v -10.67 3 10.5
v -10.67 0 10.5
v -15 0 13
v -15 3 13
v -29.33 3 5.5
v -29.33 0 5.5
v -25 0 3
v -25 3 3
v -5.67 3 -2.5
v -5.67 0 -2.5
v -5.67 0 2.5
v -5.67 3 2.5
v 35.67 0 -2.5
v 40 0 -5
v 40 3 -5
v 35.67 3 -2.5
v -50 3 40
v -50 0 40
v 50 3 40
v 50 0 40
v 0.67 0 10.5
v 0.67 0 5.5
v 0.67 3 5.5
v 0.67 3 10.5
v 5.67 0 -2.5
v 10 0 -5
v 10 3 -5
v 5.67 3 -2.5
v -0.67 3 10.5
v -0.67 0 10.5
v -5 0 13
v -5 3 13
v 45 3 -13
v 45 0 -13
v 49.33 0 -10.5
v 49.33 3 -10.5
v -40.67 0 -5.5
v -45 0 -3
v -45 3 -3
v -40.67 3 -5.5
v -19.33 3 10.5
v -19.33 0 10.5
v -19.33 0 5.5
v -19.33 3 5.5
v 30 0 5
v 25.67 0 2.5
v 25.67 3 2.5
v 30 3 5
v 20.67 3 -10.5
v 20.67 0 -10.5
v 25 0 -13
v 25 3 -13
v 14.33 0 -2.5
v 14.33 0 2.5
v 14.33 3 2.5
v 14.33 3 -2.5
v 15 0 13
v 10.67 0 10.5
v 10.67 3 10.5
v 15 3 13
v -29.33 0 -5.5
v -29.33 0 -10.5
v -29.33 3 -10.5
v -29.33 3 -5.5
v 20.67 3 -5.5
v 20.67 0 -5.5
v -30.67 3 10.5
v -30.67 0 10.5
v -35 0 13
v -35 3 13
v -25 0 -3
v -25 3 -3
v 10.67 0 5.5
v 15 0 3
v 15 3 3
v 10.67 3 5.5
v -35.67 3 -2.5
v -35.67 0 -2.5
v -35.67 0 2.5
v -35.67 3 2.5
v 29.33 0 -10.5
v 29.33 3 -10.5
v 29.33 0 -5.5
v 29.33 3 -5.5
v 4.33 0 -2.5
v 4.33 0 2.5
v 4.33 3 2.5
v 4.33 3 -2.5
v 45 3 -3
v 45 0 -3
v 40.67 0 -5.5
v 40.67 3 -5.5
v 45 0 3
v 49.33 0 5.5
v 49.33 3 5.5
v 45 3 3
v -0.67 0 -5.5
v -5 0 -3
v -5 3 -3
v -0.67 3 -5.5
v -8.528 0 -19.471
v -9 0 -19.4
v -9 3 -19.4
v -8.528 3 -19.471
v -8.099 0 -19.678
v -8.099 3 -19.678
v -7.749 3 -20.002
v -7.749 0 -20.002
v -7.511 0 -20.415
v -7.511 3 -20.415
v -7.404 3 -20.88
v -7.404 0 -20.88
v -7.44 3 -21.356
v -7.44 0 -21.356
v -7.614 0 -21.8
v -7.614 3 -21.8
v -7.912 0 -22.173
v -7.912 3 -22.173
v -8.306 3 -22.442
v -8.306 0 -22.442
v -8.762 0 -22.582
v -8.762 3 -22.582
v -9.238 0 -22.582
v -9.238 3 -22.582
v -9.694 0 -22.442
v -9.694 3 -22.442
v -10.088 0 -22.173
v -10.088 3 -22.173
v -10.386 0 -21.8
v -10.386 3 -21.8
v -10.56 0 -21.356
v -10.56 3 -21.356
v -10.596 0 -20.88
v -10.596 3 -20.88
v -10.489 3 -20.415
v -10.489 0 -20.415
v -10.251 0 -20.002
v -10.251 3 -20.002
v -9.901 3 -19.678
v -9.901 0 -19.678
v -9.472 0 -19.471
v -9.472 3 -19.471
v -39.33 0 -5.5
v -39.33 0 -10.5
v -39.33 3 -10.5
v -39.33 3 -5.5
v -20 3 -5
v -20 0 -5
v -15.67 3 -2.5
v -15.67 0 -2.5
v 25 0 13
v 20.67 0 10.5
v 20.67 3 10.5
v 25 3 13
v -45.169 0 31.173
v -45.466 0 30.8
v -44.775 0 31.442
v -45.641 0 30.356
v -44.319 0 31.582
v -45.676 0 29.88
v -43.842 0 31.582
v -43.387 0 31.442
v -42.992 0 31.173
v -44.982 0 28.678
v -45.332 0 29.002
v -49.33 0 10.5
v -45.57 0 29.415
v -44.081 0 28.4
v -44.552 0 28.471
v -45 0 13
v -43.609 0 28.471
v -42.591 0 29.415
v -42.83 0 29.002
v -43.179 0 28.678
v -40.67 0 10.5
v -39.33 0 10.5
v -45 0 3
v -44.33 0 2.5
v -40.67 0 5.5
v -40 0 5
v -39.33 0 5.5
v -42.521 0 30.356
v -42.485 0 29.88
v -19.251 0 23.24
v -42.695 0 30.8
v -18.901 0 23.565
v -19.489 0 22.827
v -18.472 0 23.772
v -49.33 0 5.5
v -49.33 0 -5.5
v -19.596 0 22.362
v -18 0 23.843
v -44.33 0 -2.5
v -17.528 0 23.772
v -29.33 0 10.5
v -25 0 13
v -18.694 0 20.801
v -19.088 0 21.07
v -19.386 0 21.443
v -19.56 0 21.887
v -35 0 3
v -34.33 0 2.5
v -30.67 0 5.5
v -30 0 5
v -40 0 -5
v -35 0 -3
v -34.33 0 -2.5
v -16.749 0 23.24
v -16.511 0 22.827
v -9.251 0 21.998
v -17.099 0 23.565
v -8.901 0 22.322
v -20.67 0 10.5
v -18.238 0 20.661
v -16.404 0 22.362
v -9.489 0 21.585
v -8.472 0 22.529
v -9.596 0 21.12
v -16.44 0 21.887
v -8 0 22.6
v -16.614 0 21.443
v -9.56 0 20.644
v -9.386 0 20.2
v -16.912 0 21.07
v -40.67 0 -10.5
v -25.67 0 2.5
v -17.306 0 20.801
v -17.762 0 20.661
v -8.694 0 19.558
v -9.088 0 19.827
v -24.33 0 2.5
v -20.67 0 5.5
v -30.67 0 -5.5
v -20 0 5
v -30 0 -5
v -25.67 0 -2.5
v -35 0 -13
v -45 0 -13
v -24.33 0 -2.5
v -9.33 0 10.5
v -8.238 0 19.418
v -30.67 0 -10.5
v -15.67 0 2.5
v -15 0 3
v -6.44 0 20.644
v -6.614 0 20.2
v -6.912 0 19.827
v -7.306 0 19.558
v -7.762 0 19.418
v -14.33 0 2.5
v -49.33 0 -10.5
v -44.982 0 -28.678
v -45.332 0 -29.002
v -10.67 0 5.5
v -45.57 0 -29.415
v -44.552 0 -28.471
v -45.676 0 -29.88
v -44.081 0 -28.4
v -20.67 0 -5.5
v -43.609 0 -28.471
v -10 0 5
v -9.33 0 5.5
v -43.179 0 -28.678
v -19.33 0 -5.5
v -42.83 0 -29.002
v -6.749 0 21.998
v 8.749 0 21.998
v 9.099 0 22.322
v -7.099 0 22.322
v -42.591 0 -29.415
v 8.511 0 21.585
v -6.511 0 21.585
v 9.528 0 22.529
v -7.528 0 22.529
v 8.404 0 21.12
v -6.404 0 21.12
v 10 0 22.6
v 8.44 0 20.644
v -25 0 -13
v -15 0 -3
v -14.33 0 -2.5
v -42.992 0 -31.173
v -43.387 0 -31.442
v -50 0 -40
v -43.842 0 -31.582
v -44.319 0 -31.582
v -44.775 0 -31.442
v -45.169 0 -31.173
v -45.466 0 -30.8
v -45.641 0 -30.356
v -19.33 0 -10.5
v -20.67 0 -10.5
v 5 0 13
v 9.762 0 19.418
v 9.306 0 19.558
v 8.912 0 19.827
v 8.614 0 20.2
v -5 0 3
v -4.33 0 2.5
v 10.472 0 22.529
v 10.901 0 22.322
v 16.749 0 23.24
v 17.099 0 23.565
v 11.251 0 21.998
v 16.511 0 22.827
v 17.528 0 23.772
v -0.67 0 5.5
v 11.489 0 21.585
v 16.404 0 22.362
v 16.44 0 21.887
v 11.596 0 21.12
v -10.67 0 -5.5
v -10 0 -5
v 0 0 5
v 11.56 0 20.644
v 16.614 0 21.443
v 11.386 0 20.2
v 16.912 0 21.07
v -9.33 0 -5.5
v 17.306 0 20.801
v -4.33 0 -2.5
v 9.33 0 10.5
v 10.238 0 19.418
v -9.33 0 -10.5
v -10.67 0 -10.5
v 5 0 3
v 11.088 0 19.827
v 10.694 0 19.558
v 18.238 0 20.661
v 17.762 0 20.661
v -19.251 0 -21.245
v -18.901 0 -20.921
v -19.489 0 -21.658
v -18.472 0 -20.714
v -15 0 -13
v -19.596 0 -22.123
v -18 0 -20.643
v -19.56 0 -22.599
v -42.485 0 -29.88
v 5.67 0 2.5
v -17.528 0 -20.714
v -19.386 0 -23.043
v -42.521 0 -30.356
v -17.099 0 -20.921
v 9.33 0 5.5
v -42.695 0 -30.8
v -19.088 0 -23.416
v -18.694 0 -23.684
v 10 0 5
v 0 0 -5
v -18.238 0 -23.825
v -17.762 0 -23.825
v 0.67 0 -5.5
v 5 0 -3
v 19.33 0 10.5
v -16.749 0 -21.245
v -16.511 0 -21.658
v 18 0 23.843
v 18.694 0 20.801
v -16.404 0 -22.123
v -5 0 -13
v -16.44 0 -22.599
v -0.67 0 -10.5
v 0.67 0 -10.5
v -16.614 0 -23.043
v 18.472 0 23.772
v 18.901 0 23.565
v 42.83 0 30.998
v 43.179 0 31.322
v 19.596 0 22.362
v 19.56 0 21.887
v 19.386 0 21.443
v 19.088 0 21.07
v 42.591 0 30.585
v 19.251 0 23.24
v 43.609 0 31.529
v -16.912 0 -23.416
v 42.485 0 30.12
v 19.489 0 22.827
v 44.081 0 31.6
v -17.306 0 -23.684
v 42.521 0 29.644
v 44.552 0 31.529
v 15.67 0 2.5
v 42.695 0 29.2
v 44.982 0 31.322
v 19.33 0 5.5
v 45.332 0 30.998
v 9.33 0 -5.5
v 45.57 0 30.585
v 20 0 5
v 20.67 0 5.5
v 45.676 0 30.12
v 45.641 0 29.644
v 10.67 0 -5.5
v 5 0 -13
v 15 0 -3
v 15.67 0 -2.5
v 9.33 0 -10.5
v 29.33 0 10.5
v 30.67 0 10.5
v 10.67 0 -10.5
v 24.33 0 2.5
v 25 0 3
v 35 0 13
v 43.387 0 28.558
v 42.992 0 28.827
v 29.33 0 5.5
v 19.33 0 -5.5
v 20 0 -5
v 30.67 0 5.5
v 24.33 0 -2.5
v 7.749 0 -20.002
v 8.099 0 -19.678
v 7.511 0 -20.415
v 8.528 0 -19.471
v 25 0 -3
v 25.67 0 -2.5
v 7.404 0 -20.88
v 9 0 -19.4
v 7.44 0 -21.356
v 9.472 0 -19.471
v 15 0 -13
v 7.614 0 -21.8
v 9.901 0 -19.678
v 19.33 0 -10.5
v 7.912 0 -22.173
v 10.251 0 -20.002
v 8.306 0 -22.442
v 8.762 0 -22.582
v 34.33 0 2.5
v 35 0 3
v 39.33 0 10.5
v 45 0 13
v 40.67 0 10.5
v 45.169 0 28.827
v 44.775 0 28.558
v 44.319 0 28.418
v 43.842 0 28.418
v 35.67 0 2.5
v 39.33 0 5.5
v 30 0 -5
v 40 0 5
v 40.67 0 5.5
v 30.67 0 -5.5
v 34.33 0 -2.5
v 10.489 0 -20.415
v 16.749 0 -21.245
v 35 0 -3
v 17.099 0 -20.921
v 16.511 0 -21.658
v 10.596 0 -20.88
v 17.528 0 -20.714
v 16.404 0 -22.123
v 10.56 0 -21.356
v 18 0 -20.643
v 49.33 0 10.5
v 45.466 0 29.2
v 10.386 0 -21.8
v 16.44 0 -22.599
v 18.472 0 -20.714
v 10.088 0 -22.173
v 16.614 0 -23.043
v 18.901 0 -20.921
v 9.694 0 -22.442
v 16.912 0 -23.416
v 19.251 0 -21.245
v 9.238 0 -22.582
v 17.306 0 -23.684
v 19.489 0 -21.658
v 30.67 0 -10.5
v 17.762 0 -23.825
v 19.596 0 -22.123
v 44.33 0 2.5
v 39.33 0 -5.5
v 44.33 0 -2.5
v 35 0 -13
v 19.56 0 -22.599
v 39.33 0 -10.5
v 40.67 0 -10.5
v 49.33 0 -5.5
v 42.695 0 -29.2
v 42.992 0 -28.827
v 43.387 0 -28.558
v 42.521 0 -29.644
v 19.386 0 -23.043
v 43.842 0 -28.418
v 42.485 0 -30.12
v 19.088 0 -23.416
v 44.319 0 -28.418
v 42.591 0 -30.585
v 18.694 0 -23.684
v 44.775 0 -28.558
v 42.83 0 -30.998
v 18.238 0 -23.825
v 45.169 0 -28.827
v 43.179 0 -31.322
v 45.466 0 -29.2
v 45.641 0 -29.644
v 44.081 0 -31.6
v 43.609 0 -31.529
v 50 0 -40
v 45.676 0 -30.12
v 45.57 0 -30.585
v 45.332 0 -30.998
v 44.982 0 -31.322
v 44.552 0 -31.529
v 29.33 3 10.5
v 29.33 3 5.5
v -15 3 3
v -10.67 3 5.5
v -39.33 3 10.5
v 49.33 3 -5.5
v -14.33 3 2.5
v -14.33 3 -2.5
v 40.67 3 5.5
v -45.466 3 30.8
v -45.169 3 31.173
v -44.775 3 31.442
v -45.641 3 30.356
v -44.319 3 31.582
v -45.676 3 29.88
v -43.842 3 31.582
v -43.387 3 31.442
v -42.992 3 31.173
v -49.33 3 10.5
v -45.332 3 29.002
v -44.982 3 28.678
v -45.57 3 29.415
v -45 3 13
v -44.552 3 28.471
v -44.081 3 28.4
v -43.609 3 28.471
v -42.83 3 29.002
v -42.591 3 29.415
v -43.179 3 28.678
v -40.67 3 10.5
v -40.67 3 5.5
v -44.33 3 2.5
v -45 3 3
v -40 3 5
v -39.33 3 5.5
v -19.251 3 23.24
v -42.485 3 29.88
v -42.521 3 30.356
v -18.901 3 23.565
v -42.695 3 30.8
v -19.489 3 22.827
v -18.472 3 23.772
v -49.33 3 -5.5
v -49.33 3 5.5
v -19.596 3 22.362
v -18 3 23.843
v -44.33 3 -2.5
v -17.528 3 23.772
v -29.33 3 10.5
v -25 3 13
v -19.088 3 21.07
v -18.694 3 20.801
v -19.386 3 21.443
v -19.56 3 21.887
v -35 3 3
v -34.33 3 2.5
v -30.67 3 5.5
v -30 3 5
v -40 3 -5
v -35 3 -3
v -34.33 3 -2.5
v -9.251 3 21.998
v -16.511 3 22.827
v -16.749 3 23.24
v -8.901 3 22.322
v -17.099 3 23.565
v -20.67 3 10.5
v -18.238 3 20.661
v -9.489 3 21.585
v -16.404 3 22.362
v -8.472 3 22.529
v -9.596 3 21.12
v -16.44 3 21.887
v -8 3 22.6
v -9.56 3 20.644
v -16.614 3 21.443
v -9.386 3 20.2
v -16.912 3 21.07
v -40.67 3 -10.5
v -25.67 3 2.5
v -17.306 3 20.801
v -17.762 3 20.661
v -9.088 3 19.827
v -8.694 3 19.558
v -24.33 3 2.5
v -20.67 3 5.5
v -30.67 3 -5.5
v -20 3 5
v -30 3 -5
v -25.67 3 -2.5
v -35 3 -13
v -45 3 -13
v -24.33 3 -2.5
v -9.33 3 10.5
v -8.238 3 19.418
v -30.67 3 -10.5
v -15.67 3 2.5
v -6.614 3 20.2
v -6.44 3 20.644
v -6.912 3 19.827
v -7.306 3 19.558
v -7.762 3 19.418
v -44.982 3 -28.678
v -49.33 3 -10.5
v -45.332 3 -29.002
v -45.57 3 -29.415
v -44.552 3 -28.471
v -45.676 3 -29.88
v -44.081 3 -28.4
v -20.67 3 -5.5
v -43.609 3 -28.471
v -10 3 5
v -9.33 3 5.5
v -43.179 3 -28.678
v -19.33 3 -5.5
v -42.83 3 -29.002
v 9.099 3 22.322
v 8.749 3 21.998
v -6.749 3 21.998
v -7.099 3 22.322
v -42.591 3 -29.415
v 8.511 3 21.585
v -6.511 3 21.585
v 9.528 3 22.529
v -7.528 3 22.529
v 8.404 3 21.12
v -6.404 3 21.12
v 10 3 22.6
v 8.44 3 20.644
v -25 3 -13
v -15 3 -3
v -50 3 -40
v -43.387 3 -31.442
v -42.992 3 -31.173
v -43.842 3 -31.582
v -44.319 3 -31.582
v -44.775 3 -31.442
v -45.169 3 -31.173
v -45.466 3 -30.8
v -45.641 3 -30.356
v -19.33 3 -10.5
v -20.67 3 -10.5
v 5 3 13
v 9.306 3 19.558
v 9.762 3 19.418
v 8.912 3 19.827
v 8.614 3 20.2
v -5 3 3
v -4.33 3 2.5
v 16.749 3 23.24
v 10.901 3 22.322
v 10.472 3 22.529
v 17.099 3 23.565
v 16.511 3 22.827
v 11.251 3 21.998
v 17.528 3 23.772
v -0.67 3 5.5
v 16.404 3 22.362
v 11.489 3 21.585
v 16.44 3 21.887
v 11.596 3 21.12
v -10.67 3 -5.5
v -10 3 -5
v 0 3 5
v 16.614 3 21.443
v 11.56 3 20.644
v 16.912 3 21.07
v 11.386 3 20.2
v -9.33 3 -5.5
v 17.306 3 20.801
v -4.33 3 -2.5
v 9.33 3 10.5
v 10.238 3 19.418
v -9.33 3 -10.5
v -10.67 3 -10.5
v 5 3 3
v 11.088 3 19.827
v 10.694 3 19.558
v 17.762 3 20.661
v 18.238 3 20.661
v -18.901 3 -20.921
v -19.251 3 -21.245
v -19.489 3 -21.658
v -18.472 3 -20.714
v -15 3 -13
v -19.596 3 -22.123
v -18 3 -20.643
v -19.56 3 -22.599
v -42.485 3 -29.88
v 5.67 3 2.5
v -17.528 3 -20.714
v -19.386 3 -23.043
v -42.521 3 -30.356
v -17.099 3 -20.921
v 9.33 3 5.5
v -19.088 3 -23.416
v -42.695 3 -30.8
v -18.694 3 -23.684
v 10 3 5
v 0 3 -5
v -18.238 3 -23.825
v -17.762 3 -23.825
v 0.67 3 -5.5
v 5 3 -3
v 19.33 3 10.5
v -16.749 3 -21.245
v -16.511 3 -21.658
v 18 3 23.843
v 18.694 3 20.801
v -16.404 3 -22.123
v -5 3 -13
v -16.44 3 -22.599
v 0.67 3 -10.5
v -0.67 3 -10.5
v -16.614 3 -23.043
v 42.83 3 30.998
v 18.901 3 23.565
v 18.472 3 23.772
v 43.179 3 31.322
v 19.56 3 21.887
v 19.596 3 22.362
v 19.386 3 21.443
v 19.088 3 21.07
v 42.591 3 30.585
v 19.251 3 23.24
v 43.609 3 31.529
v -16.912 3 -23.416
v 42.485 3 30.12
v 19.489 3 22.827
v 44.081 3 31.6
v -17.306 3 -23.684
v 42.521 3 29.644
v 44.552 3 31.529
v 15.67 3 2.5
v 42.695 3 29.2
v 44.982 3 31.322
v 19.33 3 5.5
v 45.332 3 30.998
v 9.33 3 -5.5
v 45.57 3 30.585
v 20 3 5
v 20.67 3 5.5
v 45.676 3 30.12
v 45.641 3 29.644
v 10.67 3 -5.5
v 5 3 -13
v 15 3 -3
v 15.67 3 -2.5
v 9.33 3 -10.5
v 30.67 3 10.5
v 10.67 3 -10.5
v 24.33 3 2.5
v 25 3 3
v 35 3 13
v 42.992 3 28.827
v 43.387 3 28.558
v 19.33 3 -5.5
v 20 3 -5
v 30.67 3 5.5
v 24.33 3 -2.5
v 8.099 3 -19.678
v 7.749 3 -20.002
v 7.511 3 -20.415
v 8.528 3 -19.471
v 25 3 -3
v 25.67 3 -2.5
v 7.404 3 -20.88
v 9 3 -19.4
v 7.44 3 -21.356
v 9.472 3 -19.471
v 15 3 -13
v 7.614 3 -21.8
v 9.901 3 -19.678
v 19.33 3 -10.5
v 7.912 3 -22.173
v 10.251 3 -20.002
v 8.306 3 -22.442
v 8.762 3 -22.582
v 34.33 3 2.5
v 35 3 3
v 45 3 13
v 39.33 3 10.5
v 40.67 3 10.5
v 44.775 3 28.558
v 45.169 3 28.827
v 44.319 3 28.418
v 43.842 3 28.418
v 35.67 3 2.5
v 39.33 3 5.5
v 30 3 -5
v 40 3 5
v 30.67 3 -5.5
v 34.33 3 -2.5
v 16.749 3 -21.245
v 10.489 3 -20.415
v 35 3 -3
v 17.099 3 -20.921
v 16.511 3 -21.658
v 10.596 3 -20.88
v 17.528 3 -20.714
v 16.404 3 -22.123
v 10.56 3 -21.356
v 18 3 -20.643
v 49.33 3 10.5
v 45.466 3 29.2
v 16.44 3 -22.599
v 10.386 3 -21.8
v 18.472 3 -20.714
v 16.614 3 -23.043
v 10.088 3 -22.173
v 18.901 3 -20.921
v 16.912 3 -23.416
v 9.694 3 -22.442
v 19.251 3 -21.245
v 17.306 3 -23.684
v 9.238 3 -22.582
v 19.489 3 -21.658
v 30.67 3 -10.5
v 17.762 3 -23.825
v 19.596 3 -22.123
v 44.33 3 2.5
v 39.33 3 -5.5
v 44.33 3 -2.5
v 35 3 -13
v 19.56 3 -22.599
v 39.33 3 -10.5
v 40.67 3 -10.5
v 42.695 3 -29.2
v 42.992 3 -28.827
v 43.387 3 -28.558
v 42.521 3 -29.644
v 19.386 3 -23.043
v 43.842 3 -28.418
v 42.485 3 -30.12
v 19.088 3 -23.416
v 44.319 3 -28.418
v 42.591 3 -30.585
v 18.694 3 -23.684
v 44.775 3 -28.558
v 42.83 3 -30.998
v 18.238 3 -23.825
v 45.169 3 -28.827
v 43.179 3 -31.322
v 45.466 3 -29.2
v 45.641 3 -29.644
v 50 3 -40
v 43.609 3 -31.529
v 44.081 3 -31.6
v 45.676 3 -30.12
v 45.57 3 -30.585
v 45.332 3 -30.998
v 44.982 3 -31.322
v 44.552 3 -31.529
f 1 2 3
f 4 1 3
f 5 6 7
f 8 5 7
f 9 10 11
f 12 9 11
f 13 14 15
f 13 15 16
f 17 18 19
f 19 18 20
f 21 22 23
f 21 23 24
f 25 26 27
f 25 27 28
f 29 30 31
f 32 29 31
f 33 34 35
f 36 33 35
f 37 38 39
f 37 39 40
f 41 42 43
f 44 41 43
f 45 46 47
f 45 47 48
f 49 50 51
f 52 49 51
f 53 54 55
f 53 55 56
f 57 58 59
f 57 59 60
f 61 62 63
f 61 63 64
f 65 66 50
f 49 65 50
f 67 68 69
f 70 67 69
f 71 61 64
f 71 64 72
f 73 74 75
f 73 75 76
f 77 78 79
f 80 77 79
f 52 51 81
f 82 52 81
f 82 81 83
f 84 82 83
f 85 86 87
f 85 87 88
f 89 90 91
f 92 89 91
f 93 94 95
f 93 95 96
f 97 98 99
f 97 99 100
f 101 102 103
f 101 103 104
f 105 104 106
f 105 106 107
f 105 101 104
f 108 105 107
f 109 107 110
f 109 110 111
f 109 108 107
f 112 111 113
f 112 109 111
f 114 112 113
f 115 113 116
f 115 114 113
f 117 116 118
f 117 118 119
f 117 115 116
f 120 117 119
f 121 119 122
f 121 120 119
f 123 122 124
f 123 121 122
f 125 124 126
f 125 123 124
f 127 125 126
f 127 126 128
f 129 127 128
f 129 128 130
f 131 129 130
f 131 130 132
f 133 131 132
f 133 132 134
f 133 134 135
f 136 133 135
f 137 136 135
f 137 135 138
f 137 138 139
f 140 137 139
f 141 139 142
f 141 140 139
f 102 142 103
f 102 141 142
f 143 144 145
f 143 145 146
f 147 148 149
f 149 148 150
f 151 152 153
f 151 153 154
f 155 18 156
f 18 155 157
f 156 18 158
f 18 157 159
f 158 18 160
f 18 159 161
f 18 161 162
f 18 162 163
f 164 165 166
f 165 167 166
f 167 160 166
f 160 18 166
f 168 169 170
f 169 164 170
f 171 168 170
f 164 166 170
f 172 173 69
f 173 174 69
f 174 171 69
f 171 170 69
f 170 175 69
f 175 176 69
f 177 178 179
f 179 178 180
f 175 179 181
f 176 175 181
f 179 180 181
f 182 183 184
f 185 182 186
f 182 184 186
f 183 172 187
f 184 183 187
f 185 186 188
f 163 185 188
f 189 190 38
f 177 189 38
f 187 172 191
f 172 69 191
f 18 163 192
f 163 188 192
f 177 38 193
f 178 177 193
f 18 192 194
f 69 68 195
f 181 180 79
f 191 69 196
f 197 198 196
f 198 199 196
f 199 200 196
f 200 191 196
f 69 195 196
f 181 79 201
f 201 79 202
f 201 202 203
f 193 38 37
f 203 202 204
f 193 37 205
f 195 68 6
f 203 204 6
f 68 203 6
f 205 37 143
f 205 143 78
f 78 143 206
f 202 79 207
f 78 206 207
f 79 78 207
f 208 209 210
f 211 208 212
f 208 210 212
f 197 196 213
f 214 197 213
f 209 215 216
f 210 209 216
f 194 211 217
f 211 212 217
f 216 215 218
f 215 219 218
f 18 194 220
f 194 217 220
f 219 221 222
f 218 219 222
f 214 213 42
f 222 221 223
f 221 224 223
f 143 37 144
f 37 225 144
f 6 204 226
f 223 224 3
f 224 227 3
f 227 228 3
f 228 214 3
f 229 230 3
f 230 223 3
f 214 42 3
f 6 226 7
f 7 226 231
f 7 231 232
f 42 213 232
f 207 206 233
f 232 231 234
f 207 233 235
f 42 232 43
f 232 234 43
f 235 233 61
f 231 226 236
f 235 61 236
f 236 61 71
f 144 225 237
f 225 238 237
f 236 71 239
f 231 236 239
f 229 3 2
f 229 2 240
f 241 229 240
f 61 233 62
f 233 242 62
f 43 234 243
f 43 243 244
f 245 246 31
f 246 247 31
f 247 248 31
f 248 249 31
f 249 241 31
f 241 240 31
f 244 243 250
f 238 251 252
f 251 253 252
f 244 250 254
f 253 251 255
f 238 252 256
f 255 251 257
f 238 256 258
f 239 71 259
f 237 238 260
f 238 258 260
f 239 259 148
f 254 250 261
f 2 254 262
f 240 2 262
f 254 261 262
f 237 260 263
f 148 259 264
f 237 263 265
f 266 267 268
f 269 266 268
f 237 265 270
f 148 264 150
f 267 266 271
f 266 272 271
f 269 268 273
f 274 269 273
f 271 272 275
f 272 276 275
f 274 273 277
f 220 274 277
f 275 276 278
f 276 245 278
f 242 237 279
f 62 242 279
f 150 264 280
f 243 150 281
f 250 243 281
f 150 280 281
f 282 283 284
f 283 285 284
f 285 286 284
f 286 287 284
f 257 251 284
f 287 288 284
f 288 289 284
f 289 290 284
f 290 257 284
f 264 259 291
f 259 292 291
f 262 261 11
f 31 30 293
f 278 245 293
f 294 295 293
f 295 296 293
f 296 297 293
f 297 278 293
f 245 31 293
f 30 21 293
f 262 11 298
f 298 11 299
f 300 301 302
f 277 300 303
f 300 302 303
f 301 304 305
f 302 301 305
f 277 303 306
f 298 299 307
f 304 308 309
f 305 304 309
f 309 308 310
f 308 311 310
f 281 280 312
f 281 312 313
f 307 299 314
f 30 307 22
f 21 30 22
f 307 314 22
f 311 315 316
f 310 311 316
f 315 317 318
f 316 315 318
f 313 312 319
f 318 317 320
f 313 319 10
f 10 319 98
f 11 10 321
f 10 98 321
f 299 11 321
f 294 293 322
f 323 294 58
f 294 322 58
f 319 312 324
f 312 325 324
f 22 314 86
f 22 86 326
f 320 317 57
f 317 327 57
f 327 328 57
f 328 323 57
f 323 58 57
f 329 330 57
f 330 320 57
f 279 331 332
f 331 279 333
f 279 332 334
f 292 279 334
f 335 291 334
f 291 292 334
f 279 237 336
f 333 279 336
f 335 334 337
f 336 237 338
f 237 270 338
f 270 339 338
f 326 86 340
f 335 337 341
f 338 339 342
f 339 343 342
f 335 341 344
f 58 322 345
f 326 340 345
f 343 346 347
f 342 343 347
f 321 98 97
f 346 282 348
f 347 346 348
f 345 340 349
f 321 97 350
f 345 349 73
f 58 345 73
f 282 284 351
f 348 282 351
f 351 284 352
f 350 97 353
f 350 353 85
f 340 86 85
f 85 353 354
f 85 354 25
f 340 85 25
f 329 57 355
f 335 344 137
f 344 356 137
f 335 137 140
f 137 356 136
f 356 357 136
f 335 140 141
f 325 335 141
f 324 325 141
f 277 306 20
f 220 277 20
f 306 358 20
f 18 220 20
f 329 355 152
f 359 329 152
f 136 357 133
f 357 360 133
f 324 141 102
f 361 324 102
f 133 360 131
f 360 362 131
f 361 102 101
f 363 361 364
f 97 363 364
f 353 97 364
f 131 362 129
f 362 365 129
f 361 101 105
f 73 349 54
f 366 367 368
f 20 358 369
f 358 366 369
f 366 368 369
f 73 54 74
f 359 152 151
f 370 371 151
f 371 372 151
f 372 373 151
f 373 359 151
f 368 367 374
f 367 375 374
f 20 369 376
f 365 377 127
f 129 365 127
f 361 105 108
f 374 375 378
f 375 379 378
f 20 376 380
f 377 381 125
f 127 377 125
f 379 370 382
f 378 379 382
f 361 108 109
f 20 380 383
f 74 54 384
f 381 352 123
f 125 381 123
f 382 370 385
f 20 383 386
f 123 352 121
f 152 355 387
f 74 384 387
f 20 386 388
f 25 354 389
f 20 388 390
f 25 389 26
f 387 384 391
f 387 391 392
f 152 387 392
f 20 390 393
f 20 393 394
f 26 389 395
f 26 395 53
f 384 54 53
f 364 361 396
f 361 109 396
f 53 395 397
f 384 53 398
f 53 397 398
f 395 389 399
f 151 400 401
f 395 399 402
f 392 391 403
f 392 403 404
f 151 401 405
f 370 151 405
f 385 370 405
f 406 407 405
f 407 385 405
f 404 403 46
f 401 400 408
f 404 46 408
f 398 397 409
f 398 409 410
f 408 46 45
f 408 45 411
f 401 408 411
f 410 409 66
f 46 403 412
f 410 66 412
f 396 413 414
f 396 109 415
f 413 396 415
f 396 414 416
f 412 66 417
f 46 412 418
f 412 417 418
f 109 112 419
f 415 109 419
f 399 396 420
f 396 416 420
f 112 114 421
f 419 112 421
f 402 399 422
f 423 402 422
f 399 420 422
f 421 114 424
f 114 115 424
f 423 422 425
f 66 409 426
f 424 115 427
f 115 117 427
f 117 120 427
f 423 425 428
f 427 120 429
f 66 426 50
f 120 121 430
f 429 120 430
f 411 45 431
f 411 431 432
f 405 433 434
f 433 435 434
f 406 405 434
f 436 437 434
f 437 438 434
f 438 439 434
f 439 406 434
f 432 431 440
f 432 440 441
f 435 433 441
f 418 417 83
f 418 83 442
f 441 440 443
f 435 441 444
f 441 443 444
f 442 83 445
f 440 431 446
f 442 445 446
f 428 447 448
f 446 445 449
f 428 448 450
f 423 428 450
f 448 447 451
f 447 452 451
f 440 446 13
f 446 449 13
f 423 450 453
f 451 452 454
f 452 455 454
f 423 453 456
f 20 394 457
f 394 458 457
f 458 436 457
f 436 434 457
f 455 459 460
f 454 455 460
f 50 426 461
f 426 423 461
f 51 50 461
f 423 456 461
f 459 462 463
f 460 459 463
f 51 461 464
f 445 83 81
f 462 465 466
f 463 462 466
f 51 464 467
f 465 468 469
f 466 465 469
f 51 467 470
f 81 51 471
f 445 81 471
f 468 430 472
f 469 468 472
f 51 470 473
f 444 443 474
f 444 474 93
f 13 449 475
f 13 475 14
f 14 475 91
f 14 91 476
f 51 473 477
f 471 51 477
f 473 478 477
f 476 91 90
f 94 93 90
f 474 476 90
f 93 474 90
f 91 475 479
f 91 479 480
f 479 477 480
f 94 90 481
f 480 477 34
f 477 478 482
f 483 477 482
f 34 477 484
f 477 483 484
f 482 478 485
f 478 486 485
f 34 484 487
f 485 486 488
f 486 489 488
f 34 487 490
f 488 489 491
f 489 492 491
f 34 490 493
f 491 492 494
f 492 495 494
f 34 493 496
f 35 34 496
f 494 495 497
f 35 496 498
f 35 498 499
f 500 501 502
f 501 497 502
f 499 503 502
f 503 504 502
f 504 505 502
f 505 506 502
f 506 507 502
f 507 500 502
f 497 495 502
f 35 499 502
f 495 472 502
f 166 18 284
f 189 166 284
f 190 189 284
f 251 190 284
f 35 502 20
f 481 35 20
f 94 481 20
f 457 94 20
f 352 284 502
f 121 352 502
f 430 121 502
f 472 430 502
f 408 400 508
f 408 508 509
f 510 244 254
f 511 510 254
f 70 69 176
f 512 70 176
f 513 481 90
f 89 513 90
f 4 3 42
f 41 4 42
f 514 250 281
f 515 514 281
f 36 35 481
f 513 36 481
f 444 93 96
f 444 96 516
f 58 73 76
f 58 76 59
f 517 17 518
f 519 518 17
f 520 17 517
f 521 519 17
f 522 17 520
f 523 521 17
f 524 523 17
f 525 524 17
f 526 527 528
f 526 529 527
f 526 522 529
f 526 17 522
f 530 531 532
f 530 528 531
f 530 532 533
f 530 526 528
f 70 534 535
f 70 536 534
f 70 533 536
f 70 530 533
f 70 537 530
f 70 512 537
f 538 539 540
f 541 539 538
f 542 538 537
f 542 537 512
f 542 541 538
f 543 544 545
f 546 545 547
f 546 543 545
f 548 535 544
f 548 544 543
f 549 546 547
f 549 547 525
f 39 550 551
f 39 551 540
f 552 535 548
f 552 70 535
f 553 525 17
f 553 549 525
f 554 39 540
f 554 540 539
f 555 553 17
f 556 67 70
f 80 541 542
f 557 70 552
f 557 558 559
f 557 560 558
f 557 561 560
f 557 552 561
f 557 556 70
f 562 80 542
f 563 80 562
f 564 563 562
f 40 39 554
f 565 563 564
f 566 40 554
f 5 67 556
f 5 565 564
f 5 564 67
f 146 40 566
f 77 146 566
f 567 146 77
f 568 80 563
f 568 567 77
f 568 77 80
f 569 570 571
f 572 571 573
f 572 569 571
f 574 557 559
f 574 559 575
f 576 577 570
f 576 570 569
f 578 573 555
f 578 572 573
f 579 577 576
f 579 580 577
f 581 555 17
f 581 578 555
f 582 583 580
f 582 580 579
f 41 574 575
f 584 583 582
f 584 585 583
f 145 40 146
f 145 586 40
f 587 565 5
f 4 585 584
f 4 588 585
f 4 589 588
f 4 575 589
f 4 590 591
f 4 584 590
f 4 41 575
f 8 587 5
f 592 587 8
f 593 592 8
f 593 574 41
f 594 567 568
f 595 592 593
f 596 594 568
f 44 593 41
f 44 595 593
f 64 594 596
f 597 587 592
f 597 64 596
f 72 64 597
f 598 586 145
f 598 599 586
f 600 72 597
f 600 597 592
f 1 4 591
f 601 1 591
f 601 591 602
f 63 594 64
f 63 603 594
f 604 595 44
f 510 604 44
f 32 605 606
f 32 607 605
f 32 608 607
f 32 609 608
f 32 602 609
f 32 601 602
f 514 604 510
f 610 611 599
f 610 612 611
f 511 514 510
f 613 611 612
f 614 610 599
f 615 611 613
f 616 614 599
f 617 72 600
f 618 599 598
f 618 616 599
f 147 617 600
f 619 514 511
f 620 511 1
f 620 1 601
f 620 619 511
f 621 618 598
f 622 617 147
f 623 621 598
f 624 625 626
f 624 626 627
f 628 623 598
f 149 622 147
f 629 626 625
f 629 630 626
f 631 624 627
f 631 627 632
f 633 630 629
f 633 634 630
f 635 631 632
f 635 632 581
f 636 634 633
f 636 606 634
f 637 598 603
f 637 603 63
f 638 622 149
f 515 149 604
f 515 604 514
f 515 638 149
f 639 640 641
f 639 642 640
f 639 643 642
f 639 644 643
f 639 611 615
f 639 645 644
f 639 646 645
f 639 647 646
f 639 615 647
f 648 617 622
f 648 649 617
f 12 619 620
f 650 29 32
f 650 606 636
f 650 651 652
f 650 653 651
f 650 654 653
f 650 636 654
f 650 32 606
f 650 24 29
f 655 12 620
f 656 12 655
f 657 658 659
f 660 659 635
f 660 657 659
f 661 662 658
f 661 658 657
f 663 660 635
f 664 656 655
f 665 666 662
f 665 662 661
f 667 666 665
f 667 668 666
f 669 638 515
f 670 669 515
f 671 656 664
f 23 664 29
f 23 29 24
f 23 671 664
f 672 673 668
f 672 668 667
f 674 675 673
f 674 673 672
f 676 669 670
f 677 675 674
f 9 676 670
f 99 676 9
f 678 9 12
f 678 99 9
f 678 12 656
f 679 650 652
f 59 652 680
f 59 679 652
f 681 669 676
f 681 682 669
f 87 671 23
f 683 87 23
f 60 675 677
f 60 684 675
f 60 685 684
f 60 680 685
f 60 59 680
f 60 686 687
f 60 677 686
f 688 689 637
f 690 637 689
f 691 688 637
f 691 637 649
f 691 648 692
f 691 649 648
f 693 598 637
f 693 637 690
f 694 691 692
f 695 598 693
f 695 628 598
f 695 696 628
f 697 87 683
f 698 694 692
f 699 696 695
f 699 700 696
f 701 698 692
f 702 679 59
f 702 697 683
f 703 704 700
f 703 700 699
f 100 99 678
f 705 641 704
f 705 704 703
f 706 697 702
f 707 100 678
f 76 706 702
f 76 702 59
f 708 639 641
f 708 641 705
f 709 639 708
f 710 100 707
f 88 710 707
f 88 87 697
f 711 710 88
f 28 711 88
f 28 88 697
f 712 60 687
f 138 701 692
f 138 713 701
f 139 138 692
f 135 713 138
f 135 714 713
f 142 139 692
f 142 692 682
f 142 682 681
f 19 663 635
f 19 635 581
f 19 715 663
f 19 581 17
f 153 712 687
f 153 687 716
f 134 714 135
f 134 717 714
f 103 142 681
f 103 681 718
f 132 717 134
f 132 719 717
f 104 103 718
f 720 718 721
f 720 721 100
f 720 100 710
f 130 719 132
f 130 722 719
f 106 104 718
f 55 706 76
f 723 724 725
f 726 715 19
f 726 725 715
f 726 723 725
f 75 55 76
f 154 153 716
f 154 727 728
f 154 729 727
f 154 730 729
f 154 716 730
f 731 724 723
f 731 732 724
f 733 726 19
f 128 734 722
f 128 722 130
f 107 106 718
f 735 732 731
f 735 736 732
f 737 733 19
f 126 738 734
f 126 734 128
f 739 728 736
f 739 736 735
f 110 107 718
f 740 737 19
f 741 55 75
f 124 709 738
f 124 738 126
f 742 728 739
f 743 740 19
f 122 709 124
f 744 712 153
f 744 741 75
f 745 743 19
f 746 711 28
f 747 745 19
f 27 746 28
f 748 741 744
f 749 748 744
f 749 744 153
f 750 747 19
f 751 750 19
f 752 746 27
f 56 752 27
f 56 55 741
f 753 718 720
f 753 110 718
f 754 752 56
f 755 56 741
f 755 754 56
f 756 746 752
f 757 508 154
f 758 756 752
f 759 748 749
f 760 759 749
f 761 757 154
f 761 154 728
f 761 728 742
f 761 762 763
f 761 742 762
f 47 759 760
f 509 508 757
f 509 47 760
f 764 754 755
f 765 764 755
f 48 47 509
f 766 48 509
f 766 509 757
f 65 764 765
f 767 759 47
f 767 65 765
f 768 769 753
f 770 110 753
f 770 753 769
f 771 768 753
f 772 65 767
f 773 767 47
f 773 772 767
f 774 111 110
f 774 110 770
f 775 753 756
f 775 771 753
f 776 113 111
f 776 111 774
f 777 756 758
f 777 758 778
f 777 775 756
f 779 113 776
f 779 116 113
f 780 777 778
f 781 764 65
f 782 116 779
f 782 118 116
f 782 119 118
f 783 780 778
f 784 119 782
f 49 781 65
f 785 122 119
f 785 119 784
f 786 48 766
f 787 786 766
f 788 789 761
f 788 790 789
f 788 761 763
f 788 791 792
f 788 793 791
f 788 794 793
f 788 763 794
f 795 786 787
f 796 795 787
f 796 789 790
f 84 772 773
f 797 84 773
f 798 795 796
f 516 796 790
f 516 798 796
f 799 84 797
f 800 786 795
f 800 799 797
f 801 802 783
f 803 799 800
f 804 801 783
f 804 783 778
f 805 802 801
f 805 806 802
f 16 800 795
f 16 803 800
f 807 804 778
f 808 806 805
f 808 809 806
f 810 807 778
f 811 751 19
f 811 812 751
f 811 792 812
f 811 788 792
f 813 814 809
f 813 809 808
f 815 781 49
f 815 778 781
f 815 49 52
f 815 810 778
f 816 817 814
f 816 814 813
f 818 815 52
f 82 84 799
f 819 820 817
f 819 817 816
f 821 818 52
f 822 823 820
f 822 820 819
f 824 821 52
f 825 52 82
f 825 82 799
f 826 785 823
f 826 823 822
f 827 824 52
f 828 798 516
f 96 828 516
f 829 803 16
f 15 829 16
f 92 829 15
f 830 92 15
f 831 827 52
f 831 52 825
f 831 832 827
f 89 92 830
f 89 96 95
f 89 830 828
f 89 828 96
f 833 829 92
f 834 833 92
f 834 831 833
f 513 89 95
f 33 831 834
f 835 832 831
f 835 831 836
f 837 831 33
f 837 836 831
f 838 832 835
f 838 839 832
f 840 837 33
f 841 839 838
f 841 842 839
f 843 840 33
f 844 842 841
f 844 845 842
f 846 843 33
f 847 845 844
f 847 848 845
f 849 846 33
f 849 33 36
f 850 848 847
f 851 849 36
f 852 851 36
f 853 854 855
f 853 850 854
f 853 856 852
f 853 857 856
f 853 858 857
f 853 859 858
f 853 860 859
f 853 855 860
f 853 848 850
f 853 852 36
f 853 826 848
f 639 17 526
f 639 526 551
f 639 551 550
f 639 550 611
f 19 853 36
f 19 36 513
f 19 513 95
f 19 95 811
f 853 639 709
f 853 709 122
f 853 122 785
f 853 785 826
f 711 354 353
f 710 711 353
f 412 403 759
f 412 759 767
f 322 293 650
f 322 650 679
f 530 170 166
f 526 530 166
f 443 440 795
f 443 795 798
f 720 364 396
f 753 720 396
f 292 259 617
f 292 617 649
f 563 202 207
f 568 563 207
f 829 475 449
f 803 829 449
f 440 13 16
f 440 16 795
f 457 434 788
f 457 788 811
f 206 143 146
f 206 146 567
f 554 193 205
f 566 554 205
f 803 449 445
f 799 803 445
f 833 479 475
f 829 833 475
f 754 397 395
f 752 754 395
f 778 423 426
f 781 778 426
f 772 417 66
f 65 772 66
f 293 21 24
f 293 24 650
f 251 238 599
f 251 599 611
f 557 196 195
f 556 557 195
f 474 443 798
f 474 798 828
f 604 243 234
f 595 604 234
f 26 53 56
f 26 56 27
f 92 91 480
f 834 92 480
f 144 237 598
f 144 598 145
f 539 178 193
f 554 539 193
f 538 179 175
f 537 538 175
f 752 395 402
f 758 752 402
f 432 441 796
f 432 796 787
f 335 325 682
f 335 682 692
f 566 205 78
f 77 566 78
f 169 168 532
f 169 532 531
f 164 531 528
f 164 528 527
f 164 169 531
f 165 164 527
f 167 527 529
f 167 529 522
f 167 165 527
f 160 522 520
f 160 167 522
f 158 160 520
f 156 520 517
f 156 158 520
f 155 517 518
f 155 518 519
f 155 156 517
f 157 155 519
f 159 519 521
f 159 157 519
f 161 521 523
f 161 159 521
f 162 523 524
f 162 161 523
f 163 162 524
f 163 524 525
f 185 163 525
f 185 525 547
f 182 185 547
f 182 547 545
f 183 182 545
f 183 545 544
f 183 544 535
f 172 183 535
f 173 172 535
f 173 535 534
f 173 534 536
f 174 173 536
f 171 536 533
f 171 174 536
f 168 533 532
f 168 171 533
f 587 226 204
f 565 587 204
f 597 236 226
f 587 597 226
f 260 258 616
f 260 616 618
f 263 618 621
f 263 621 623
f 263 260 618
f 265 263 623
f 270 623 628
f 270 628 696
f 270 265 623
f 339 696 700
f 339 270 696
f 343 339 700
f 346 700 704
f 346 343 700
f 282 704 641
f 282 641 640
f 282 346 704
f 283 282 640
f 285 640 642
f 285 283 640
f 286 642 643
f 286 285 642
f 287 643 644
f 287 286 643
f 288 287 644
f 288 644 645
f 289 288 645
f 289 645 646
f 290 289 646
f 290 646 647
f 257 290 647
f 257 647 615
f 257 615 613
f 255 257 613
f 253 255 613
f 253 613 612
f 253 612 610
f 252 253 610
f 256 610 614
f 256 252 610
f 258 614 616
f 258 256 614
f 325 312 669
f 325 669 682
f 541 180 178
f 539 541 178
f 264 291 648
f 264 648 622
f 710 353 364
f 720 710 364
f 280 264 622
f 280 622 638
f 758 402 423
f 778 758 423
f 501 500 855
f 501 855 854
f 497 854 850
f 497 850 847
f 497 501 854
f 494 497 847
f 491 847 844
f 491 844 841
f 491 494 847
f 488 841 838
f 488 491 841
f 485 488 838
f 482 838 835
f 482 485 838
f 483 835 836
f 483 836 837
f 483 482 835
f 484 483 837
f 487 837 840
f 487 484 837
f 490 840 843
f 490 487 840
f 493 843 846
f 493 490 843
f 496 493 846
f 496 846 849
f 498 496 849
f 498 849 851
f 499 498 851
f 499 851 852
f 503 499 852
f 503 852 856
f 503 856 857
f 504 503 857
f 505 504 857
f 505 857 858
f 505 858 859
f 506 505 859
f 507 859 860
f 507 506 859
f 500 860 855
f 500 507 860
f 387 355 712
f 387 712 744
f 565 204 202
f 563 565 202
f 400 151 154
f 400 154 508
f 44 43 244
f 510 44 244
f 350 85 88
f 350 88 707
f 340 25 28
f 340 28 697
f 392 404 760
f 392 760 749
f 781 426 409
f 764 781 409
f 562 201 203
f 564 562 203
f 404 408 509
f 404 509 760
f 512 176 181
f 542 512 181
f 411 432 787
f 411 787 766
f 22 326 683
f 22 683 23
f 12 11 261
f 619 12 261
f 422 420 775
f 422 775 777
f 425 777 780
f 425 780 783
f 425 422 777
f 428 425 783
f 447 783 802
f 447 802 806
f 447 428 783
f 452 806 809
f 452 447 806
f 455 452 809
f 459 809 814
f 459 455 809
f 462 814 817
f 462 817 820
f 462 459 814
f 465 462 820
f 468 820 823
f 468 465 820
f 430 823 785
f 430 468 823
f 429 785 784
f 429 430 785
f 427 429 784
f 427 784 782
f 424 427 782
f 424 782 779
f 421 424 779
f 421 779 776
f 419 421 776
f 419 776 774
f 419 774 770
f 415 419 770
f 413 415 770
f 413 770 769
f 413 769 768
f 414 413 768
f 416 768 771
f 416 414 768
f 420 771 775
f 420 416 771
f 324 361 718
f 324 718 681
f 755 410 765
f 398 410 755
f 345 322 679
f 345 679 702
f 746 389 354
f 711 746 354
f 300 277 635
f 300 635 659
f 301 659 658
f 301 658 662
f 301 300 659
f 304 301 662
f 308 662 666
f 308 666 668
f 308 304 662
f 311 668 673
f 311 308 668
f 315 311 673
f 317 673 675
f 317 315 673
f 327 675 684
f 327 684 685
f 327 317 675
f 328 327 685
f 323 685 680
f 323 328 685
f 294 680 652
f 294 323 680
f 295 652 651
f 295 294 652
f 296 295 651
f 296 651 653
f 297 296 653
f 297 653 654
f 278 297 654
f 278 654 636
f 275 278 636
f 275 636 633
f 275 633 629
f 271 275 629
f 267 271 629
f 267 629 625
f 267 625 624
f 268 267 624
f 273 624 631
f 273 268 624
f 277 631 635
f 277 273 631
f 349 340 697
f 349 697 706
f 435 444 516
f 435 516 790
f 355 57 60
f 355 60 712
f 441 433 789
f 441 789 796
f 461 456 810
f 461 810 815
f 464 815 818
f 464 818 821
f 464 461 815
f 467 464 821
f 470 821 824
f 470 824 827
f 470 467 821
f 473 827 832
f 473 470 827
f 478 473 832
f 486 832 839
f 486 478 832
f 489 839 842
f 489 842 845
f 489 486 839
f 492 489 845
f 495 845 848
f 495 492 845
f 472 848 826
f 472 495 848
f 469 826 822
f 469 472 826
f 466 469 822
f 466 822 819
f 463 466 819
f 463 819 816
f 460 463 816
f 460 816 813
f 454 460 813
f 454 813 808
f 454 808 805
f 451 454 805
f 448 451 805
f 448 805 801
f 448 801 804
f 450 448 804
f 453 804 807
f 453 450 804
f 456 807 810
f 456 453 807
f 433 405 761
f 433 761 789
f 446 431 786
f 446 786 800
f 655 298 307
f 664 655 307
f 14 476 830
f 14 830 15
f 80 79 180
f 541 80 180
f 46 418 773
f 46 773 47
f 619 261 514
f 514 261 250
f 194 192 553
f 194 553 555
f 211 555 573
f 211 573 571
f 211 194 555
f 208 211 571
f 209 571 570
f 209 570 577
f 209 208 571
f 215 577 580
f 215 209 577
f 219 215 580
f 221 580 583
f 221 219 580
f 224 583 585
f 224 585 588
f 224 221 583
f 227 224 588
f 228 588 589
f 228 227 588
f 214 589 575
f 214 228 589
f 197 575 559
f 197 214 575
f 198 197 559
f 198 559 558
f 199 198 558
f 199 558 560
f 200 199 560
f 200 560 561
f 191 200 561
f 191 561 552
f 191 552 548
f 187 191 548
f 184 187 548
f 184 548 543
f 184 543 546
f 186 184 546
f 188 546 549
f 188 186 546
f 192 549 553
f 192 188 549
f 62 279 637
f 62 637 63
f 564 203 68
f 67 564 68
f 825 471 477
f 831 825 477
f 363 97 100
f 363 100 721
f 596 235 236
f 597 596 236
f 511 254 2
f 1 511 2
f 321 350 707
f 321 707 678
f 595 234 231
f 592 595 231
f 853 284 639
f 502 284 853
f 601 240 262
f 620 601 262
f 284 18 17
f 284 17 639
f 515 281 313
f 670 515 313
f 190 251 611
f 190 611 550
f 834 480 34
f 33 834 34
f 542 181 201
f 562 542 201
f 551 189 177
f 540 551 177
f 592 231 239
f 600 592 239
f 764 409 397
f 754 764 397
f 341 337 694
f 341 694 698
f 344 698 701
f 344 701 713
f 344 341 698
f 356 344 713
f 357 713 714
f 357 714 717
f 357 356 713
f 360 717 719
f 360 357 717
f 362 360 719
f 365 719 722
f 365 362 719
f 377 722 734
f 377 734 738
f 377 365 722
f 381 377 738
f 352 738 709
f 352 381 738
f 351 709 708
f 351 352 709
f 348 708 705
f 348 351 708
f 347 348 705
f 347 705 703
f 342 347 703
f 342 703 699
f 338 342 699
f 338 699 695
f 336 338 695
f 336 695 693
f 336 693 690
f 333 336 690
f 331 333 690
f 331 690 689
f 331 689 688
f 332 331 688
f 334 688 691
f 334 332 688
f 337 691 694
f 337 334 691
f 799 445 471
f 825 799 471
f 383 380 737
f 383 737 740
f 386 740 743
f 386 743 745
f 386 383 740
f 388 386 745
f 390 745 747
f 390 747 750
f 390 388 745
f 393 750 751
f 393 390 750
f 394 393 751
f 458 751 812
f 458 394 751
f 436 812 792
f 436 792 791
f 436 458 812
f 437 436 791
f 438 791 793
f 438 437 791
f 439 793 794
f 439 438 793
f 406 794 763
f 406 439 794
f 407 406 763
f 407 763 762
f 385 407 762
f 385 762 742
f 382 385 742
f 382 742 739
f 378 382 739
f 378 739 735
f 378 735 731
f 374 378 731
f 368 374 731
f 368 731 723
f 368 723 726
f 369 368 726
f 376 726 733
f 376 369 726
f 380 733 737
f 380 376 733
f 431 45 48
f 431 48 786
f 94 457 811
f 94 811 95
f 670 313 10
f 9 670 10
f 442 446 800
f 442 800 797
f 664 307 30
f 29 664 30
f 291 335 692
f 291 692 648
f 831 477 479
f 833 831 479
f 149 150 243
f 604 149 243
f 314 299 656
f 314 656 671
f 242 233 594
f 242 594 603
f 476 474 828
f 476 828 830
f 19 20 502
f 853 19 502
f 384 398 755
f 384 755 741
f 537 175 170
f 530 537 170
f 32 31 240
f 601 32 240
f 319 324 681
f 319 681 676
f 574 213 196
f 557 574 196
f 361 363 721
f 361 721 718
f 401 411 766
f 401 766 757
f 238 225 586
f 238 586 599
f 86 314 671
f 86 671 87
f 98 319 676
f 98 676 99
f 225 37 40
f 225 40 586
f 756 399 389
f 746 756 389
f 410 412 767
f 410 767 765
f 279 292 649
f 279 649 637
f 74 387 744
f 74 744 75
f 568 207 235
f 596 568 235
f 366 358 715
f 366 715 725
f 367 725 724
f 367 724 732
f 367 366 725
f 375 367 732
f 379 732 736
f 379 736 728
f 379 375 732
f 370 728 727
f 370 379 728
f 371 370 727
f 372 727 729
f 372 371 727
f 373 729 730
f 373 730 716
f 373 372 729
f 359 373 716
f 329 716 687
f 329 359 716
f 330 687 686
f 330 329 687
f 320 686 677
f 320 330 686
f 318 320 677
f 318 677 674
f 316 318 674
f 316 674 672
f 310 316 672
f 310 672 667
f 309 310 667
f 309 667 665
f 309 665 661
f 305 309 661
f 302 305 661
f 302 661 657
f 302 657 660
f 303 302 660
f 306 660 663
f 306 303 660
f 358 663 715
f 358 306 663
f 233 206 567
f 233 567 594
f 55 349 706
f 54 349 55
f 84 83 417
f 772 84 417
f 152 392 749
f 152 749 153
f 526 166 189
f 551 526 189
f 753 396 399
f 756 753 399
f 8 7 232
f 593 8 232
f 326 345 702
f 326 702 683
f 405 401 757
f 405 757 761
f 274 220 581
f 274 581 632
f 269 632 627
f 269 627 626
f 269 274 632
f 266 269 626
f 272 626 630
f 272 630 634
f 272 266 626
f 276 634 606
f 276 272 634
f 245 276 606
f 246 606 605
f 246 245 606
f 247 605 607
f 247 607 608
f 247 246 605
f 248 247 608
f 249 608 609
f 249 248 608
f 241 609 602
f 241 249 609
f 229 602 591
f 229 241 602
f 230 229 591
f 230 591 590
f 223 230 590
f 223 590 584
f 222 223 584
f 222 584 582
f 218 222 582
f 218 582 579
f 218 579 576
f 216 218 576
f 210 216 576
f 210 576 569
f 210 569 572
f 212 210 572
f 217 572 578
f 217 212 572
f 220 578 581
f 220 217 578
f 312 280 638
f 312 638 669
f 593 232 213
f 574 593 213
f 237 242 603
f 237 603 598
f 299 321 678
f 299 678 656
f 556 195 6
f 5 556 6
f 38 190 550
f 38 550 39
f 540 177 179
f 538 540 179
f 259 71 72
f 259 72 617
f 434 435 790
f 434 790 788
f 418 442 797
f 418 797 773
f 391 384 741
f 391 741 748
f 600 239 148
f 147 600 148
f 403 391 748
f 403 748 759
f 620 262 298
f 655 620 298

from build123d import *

# Parameters (mm, degrees)
SKETCH_1_W      = 100
SKETCH_1_H      = 80
SKETCH_1_R      = 1.6
EXTRUDE_1_DEPTH = 3


with BuildPart() as part:
    # 草图1 → 凸台-拉伸1 (new body)
    with BuildSketch(Plane(origin=(0, 0, 0), x_dir=(1, 0, 0), z_dir=(0, 1, 0))):
        Rectangle(SKETCH_1_W, SKETCH_1_H)
        with Locations(Location((-18, 22.242640687, 0), (0, 0, 270))):
            Circle(SKETCH_1_R, mode=Mode.SUBTRACT)
        with Locations(Location((18, 22.242640687, 0), (0, 0, 270))):
            Circle(SKETCH_1_R, mode=Mode.SUBTRACT)
        with Locations(Location((-18, -22.242640687, 0), (0, 0, 270))):
            Circle(SKETCH_1_R, mode=Mode.SUBTRACT)
        with Locations(Location((18, -22.242640687, 0), (0, 0, 270))):
            Circle(SKETCH_1_R, mode=Mode.SUBTRACT)
        with Locations(Location((-9, 21, 0), (0, 0, 270))):
            Circle(SKETCH_1_R, mode=Mode.SUBTRACT)
        with Locations(Location((9, 21, 0), (0, 0, 270))):
            Circle(SKETCH_1_R, mode=Mode.SUBTRACT)
        with Locations(Location((10, -21, 0), (0, 0, 270))):
            Circle(SKETCH_1_R, mode=Mode.SUBTRACT)
        with Locations(Location((-8, -21, 0), (0, 0, 270))):
            Circle(SKETCH_1_R, mode=Mode.SUBTRACT)
        with Locations(Location((-44.080756497, 30, 0), (0, 0, 270))):
            Circle(SKETCH_1_R, mode=Mode.SUBTRACT)
        with Locations(Location((44.080756497, 30, 0), (0, 0, 90))):
            Circle(SKETCH_1_R, mode=Mode.SUBTRACT)
        with Locations(Location((-44.080756497, -30, 0), (0, 0, 90))):
            Circle(SKETCH_1_R, mode=Mode.SUBTRACT)
        with Locations(Location((44.080756497, -30, 0), (0, 0, 270))):
            Circle(SKETCH_1_R, mode=Mode.SUBTRACT)
        Polygon((0, 5), (-4.330127019, 2.5), (-4.330127019, -2.5), (0, -5), (4.330127019, -2.5), (4.330127019, 2.5), align=None, mode=Mode.SUBTRACT)
        Polygon((5, -3), (0.669872981, -5.5), (0.669872981, -10.5), (5, -13), (9.330127019, -10.5), (9.330127019, -5.5), align=None, mode=Mode.SUBTRACT)
        Polygon((10, 5), (5.669872981, 2.5), (5.669872981, -2.5), (10, -5), (14.330127019, -2.5), (14.330127019, 2.5), align=None, mode=Mode.SUBTRACT)
        Polygon((20, 5), (15.669872981, 2.5), (15.669872981, -2.5), (20, -5), (24.330127019, -2.5), (24.330127019, 2.5), align=None, mode=Mode.SUBTRACT)
        Polygon((30, 5), (25.669872981, 2.5), (25.669872981, -2.5), (30, -5), (34.330127019, -2.5), (34.330127019, 2.5), align=None, mode=Mode.SUBTRACT)
        Polygon((40, 5), (35.669872981, 2.5), (35.669872981, -2.5), (40, -5), (44.330127019, -2.5), (44.330127019, 2.5), align=None, mode=Mode.SUBTRACT)
        Polygon((-44.330127019, 2.5), (-40, 5), (-35.669872981, 2.5), (-35.669872981, -2.5), (-40, -5), (-44.330127019, -2.5), align=None, mode=Mode.SUBTRACT)
        Polygon((-34.330127019, 2.5), (-30, 5), (-25.669872981, 2.5), (-25.669872981, -2.5), (-30, -5), (-34.330127019, -2.5), align=None, mode=Mode.SUBTRACT)
        Polygon((-24.330127019, 2.5), (-20, 5), (-15.669872981, 2.5), (-15.669872981, -2.5), (-20, -5), (-24.330127019, -2.5), align=None, mode=Mode.SUBTRACT)
        Polygon((-14.330127019, 2.5), (-10, 5), (-5.669872981, 2.5), (-5.669872981, -2.5), (-10, -5), (-14.330127019, -2.5), align=None, mode=Mode.SUBTRACT)
        Polygon((15, -3), (10.669872981, -5.5), (10.669872981, -10.5), (15, -13), (19.330127019, -10.5), (19.330127019, -5.5), align=None, mode=Mode.SUBTRACT)
        Polygon((25, -3), (20.669872981, -5.5), (20.669872981, -10.5), (25, -13), (29.330127019, -10.5), (29.330127019, -5.5), align=None, mode=Mode.SUBTRACT)
        Polygon((35, -3), (30.669872981, -5.5), (30.669872981, -10.5), (35, -13), (39.330127019, -10.5), (39.330127019, -5.5), align=None, mode=Mode.SUBTRACT)
        Polygon((45, -3), (40.669872981, -5.5), (40.669872981, -10.5), (45, -13), (49.330127019, -10.5), (49.330127019, -5.5), align=None, mode=Mode.SUBTRACT)
        Polygon((-49.330127019, -5.5), (-45, -3), (-40.669872981, -5.5), (-40.669872981, -10.5), (-45, -13), (-49.330127019, -10.5), align=None, mode=Mode.SUBTRACT)
        Polygon((-39.330127019, -5.5), (-35, -3), (-30.669872981, -5.5), (-30.669872981, -10.5), (-35, -13), (-39.330127019, -10.5), align=None, mode=Mode.SUBTRACT)
        Polygon((-29.330127019, -5.5), (-25, -3), (-20.669872981, -5.5), (-20.669872981, -10.5), (-25, -13), (-29.330127019, -10.5), align=None, mode=Mode.SUBTRACT)
        Polygon((-19.330127019, -5.5), (-15, -3), (-10.669872981, -5.5), (-10.669872981, -10.5), (-15, -13), (-19.330127019, -10.5), align=None, mode=Mode.SUBTRACT)
        Polygon((-9.330127019, -5.5), (-5, -3), (-0.669872981, -5.5), (-0.669872981, -10.5), (-5, -13), (-9.330127019, -10.5), align=None, mode=Mode.SUBTRACT)
        Polygon((49.330127019, 5.5), (45, 3), (40.669872981, 5.5), (40.669872981, 10.5), (45, 13), (49.330127019, 10.5), align=None, mode=Mode.SUBTRACT)
        Polygon((39.330127019, 5.5), (35, 3), (30.669872981, 5.5), (30.669872981, 10.5), (35, 13), (39.330127019, 10.5), align=None, mode=Mode.SUBTRACT)
        Polygon((29.330127019, 5.5), (25, 3), (20.669872981, 5.5), (20.669872981, 10.5), (25, 13), (29.330127019, 10.5), align=None, mode=Mode.SUBTRACT)
        Polygon((19.330127019, 5.5), (15, 3), (10.669872981, 5.5), (10.669872981, 10.5), (15, 13), (19.330127019, 10.5), align=None, mode=Mode.SUBTRACT)
        Polygon((9.330127019, 5.5), (5, 3), (0.669872981, 5.5), (0.669872981, 10.5), (5, 13), (9.330127019, 10.5), align=None, mode=Mode.SUBTRACT)
        Polygon((-9.330127019, 10.5), (-9.330127019, 5.5), (-5, 3), (-0.669872981, 5.5), (-0.669872981, 10.5), (-5, 13), align=None, mode=Mode.SUBTRACT)
        Polygon((-19.330127019, 10.5), (-19.330127019, 5.5), (-15, 3), (-10.669872981, 5.5), (-10.669872981, 10.5), (-15, 13), align=None, mode=Mode.SUBTRACT)
        Polygon((-29.330127019, 10.5), (-29.330127019, 5.5), (-25, 3), (-20.669872981, 5.5), (-20.669872981, 10.5), (-25, 13), align=None, mode=Mode.SUBTRACT)
        Polygon((-39.330127019, 10.5), (-39.330127019, 5.5), (-35, 3), (-30.669872981, 5.5), (-30.669872981, 10.5), (-35, 13), align=None, mode=Mode.SUBTRACT)
        Polygon((-49.330127019, 10.5), (-49.330127019, 5.5), (-45, 3), (-40.669872981, 5.5), (-40.669872981, 10.5), (-45, 13), align=None, mode=Mode.SUBTRACT)
    extrude(amount=EXTRUDE_1_DEPTH)


solid = part.part
